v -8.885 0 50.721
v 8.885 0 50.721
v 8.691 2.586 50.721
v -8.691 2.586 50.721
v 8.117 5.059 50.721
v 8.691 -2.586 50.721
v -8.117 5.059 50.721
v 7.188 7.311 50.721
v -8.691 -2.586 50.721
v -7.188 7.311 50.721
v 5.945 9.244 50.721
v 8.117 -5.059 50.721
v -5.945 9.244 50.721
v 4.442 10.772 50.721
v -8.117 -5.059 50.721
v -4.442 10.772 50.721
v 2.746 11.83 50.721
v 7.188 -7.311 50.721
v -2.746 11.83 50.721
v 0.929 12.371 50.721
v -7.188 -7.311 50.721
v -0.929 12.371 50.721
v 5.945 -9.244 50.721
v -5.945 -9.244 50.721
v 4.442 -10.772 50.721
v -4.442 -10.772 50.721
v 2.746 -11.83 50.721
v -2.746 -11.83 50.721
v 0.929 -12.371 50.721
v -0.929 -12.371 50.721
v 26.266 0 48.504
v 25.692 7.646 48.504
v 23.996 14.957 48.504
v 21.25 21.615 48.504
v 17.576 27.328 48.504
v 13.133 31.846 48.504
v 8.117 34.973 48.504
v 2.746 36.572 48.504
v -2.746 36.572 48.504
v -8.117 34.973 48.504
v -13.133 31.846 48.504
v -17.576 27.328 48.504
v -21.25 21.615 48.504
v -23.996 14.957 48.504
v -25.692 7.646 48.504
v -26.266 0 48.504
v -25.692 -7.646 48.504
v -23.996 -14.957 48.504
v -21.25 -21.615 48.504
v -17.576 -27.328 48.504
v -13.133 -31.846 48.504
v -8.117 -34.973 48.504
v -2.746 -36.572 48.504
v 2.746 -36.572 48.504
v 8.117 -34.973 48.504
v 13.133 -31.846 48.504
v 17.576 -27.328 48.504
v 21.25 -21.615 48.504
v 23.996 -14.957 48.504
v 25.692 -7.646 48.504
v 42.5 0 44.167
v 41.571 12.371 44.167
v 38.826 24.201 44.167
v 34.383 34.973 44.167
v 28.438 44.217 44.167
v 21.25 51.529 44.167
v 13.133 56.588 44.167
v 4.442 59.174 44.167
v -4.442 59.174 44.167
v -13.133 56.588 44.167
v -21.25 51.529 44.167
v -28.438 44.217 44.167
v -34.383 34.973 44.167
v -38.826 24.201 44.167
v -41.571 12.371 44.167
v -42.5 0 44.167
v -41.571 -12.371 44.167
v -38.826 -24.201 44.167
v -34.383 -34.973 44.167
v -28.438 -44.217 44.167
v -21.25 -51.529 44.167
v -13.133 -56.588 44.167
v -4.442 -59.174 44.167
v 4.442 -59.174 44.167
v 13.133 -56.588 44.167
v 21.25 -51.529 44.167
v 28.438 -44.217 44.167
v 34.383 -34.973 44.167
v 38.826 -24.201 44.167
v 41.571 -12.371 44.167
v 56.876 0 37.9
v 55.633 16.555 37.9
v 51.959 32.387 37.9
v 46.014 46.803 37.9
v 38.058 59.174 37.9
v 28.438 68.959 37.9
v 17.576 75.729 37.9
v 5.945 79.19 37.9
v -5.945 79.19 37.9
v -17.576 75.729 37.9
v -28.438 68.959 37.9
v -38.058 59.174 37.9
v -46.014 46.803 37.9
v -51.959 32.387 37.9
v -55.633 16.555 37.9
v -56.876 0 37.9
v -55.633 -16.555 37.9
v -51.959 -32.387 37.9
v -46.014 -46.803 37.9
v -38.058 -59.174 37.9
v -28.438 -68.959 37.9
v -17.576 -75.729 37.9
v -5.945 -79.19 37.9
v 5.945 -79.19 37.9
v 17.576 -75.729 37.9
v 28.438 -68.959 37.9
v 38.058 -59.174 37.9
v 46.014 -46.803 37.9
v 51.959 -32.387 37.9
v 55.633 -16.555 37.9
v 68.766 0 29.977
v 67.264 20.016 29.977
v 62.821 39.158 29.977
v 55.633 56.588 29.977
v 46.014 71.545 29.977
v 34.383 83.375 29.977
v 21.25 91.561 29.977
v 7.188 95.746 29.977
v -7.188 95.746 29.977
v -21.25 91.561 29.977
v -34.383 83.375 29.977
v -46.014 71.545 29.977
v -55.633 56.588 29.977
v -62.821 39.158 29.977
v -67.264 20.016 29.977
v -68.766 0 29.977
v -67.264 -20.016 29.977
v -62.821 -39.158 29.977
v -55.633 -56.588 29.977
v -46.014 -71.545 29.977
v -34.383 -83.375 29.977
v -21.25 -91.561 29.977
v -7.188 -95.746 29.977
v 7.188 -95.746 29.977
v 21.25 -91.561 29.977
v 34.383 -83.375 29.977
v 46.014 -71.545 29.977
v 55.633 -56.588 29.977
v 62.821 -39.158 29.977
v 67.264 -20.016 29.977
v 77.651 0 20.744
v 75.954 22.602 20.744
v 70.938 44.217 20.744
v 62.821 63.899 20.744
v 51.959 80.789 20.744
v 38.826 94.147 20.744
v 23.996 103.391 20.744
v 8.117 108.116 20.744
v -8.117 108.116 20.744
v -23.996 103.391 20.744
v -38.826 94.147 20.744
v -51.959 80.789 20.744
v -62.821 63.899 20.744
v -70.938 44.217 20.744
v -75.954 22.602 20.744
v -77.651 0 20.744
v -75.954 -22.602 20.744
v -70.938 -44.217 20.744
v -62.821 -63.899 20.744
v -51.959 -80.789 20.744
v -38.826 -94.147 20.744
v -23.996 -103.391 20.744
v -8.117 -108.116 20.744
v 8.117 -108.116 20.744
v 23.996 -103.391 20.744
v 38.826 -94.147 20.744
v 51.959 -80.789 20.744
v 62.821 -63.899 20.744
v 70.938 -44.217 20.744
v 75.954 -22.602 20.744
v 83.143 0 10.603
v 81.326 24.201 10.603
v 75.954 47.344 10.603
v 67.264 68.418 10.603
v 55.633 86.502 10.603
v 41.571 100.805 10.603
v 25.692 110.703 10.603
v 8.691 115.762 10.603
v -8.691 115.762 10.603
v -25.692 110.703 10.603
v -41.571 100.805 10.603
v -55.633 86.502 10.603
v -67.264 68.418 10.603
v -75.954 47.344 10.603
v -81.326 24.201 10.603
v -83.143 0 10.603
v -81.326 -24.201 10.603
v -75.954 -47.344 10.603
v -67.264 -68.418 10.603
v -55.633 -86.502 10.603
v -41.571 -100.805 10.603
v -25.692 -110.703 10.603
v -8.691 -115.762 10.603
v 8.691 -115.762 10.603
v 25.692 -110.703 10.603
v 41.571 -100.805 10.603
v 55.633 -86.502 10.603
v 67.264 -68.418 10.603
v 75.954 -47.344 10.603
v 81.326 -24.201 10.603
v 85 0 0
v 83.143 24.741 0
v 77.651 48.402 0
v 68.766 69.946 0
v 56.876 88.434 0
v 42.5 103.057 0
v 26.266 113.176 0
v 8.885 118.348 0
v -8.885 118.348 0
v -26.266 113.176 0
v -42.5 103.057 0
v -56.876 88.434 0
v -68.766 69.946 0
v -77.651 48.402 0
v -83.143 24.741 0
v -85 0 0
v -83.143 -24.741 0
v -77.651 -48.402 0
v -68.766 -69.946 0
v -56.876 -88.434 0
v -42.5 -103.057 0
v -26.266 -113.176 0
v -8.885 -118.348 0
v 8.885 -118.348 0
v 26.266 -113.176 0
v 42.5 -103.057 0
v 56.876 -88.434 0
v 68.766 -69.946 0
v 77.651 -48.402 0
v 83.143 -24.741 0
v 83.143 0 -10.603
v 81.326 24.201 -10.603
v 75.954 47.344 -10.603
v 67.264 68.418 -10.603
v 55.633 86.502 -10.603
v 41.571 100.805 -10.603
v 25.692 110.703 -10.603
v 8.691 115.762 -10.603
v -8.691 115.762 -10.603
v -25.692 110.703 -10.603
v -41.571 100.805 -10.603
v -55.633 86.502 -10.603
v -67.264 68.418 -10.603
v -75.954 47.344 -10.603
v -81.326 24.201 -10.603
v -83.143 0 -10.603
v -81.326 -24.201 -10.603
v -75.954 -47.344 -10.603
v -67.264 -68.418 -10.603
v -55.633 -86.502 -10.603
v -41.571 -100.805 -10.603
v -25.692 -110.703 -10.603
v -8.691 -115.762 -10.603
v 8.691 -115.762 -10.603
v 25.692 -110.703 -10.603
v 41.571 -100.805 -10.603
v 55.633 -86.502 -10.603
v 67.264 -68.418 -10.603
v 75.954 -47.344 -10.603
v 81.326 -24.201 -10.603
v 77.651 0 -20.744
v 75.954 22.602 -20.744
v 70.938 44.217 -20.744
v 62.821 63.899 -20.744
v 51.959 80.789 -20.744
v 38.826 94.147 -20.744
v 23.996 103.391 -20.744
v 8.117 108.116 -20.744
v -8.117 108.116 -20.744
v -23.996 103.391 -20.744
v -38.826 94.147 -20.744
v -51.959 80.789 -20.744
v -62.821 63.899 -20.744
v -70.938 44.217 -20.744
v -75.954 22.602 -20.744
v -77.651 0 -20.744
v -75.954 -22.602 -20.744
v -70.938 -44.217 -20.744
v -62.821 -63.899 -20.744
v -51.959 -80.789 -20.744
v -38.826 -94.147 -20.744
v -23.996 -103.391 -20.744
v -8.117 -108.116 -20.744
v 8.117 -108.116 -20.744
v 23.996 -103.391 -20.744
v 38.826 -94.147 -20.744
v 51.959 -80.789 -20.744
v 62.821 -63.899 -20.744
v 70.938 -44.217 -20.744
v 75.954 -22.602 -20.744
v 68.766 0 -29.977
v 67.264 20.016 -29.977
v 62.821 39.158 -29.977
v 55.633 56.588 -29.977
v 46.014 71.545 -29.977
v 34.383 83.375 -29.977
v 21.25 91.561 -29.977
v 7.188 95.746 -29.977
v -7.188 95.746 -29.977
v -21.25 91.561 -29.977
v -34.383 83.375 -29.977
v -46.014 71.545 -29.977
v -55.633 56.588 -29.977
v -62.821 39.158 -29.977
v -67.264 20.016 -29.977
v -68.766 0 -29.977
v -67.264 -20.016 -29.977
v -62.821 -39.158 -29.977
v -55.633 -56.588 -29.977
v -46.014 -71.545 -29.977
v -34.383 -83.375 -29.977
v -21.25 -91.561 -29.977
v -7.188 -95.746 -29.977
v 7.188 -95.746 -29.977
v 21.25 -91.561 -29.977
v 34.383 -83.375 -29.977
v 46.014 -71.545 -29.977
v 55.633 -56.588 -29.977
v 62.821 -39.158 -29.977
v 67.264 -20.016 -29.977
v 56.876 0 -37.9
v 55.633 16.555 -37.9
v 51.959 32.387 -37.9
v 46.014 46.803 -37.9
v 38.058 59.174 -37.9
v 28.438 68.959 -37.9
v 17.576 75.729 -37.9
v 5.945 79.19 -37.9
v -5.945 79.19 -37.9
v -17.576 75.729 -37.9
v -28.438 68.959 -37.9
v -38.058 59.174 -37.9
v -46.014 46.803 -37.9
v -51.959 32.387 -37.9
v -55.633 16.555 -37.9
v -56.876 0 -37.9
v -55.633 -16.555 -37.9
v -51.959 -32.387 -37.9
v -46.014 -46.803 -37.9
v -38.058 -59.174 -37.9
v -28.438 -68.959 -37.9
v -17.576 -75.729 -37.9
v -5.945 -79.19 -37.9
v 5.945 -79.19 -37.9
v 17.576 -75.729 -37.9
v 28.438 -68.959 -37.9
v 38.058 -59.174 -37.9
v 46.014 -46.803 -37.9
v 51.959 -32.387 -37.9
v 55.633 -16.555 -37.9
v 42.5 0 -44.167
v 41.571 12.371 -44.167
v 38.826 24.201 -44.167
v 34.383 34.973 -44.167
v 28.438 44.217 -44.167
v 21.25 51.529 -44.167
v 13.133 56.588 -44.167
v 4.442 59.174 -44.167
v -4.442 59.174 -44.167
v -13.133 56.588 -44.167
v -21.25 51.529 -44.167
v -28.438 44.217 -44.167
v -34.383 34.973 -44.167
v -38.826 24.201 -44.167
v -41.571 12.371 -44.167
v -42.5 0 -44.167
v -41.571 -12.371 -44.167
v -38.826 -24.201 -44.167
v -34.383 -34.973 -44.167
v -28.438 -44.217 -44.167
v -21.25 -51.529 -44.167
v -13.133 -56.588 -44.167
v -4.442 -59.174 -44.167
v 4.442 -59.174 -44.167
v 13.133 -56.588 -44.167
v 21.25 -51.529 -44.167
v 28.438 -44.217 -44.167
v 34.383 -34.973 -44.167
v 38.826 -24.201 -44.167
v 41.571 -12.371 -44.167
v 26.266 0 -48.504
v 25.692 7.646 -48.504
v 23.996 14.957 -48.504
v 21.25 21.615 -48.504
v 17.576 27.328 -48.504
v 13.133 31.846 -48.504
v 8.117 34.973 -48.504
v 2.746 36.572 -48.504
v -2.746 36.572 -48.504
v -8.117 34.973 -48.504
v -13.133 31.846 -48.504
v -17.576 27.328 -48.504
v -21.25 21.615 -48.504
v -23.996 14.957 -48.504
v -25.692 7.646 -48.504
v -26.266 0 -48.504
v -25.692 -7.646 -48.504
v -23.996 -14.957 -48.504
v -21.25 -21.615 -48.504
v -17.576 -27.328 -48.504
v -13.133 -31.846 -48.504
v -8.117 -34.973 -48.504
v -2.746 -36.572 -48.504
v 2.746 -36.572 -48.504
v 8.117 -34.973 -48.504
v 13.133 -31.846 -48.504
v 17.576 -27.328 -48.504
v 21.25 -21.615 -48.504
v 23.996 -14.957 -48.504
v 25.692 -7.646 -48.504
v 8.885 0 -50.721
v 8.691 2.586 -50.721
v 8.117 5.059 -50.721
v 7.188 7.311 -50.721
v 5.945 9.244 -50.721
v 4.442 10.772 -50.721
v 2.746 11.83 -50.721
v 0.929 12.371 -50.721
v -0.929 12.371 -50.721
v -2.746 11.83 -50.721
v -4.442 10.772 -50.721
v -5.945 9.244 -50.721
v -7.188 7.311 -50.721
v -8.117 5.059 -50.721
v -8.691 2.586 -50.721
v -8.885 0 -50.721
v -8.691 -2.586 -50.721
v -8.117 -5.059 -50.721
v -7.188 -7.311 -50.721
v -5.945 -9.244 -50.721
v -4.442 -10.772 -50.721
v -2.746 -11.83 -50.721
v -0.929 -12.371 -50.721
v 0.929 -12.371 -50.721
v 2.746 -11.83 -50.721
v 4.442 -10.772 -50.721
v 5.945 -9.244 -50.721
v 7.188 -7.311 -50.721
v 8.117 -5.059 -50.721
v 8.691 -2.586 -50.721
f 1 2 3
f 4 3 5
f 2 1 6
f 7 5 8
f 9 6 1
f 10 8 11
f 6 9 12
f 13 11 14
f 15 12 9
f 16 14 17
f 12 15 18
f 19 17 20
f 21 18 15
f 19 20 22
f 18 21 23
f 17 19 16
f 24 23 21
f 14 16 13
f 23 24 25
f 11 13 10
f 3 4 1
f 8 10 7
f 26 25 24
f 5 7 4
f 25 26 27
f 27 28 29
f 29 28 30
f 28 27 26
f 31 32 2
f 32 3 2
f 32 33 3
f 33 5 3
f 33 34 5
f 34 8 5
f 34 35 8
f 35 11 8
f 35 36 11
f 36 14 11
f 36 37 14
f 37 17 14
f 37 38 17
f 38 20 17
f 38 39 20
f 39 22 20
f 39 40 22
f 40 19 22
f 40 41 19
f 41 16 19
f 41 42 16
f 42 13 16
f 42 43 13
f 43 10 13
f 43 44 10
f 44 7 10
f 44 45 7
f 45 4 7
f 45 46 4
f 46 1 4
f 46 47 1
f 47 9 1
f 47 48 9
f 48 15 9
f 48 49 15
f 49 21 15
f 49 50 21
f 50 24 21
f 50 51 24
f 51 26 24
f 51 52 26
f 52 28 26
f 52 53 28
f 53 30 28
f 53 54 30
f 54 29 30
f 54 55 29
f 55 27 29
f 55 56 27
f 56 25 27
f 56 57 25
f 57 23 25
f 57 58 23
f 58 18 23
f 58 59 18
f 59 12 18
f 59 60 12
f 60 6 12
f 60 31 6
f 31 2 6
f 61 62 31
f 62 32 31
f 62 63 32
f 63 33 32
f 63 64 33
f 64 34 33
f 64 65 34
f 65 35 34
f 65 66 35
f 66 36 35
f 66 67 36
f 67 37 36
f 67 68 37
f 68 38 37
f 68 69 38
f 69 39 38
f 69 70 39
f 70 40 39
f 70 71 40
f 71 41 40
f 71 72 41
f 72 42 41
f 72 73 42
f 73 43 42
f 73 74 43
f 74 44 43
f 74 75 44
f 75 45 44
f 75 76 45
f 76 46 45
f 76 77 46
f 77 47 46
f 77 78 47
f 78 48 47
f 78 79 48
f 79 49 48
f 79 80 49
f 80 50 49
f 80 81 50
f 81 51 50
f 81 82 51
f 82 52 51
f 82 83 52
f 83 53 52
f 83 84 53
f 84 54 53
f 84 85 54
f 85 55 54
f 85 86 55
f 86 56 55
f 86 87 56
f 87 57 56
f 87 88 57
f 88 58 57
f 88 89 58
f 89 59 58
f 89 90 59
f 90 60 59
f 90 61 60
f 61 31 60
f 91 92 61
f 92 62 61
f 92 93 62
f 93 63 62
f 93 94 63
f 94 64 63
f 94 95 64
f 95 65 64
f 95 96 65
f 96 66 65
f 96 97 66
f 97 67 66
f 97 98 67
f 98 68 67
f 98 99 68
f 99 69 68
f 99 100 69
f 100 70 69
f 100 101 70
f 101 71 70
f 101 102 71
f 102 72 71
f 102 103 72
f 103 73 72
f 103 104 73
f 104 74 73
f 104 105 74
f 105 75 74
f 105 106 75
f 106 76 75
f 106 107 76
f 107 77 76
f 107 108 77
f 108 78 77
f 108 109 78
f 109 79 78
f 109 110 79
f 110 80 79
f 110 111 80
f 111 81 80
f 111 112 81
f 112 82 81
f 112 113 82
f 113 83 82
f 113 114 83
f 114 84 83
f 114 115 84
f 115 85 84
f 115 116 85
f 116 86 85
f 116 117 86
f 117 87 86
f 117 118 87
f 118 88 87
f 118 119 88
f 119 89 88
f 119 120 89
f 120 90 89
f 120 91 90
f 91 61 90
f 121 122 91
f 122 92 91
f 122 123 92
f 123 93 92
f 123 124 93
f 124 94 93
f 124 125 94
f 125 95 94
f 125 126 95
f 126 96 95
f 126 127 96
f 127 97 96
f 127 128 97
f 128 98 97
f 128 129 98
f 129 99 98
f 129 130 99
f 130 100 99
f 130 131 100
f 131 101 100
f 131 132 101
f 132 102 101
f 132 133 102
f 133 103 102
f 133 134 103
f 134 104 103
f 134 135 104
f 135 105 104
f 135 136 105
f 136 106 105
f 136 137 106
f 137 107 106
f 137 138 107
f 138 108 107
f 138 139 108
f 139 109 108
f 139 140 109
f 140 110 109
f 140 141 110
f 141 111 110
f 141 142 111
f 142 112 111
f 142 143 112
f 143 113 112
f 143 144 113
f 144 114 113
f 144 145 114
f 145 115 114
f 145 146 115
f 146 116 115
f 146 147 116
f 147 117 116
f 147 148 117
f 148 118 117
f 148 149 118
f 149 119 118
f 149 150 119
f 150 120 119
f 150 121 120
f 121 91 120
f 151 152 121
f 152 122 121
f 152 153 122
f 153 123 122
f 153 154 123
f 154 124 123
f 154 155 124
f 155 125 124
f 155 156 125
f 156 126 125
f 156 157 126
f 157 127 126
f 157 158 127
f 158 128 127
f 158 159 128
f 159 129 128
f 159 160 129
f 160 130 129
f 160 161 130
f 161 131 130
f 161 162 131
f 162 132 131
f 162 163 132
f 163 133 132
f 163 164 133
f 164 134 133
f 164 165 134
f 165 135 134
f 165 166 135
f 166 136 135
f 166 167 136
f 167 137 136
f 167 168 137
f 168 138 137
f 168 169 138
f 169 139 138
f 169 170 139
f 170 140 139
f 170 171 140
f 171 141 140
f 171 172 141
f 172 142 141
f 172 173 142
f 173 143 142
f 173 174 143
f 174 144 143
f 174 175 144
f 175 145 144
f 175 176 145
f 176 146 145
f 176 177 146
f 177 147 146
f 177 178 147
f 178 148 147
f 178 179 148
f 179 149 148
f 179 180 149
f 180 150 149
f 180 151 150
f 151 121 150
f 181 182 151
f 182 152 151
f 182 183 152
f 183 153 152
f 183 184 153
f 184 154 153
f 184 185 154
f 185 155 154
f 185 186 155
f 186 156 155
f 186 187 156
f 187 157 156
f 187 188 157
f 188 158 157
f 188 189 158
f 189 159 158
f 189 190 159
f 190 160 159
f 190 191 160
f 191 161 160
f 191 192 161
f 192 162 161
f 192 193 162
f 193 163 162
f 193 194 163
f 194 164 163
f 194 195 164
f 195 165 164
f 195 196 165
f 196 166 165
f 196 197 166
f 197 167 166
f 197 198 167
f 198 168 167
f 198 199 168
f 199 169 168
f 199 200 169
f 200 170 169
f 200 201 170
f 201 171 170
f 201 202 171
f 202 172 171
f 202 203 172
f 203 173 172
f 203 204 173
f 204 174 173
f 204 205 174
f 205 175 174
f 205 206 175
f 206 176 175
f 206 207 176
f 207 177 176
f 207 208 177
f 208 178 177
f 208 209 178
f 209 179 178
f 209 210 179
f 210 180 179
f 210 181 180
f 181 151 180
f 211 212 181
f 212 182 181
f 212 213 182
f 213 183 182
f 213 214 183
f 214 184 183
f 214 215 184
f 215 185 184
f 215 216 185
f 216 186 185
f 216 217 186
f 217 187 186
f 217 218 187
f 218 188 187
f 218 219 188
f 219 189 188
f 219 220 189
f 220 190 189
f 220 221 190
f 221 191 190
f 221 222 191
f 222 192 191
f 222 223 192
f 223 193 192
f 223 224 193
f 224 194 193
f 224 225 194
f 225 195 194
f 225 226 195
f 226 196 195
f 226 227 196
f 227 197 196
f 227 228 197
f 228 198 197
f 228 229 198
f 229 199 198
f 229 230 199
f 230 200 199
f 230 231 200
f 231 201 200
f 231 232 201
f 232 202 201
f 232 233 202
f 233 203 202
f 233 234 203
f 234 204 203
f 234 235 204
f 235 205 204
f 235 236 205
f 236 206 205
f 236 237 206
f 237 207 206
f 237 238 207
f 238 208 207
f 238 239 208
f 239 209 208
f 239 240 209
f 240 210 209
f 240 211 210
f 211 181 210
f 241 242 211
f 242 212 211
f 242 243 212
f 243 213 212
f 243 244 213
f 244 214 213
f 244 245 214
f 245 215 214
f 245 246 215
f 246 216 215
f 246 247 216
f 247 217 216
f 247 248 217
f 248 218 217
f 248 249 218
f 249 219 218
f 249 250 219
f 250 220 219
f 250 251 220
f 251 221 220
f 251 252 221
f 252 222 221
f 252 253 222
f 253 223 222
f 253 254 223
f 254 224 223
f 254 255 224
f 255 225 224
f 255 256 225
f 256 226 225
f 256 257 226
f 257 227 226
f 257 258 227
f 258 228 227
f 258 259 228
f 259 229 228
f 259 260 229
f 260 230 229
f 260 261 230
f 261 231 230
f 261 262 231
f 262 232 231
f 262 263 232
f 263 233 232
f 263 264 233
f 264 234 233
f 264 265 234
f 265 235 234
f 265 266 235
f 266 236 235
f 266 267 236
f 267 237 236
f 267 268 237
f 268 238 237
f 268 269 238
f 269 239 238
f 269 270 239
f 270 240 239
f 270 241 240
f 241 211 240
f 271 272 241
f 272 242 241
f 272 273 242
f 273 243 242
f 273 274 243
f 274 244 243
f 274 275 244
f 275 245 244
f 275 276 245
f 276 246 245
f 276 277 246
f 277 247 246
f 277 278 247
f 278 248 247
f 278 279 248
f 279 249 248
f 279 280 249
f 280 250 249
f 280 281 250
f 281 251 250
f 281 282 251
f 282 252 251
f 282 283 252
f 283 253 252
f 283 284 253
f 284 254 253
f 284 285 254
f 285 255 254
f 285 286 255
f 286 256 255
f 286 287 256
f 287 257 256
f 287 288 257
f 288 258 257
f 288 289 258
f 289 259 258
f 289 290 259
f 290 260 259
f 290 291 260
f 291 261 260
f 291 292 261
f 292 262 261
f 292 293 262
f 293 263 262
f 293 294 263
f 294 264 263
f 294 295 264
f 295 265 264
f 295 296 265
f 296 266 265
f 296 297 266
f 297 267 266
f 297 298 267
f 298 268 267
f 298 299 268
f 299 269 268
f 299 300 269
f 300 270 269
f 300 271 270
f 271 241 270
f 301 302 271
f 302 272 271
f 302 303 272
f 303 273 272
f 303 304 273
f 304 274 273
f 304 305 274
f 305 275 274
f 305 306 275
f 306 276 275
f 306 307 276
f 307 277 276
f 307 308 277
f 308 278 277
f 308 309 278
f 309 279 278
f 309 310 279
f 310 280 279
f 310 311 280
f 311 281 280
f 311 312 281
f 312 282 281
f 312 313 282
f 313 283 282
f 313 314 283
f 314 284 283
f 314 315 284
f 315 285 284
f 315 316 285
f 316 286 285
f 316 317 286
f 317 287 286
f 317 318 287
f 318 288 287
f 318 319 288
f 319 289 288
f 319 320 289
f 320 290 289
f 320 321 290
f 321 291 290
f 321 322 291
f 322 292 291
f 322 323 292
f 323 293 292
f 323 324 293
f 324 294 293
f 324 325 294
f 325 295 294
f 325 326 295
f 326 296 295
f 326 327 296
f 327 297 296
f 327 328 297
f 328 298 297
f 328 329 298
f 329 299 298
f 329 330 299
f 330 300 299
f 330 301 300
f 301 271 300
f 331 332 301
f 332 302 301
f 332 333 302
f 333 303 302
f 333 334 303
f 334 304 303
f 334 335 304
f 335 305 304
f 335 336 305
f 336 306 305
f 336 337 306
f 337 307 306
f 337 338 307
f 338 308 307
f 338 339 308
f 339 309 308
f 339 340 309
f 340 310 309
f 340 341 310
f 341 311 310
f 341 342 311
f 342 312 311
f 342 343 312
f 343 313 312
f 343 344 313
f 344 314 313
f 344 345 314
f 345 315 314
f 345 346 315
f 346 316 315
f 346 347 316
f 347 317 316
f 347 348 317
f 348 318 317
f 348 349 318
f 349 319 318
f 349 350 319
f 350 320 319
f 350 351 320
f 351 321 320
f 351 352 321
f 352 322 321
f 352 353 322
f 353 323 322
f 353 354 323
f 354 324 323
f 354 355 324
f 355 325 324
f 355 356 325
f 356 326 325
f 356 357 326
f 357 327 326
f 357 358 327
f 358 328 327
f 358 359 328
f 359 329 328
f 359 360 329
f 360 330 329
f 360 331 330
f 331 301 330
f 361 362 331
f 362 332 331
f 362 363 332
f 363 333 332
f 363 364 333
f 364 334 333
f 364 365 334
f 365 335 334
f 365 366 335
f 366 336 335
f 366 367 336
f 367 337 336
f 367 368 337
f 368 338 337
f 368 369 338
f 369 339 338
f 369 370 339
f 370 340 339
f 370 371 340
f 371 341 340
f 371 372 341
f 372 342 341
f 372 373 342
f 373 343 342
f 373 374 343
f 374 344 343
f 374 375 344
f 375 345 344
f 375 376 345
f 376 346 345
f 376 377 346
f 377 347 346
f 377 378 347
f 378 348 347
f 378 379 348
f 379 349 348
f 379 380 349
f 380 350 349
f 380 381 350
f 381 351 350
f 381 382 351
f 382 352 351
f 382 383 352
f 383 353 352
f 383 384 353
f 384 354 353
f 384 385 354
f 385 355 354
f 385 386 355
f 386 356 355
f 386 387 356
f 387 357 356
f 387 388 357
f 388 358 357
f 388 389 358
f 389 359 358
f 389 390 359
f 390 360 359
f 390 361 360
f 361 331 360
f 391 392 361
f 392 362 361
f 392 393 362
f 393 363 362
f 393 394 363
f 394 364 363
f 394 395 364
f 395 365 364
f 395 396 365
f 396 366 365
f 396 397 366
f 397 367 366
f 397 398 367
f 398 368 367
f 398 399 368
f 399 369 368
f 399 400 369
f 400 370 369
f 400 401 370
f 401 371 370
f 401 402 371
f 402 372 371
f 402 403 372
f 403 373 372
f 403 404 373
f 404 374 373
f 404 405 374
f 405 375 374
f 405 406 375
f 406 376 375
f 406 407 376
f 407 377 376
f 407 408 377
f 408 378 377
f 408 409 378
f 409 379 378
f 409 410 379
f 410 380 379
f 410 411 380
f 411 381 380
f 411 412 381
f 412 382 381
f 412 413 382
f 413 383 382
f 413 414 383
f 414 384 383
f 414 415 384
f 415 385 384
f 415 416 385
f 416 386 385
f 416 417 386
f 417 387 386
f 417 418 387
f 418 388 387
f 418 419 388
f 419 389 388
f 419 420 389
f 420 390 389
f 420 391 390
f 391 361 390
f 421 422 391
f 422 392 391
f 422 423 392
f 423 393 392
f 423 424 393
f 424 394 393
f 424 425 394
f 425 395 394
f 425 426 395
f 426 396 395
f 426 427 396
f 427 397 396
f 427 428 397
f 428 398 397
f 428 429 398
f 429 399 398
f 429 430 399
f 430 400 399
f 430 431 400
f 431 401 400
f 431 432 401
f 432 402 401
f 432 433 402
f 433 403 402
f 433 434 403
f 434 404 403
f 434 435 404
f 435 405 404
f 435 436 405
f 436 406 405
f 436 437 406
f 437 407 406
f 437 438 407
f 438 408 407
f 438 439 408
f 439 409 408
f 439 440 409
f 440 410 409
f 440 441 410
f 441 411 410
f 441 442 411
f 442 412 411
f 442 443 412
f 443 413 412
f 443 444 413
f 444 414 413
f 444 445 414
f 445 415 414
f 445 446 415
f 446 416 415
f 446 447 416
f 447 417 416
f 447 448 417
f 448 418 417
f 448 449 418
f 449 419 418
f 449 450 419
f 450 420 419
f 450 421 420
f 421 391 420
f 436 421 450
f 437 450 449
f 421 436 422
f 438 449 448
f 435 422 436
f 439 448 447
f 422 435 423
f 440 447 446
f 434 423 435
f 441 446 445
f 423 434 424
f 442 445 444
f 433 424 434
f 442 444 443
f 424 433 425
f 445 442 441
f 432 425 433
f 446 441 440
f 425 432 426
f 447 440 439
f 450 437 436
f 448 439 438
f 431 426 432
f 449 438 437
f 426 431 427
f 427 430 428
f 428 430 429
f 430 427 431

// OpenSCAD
// Generated by SolidPython 1.0.1 on 2020-07-29 00:46:46


scale(v = [5, 7, 3]) {
	sphere(r = 17);
}
/***********************************************
*********      SolidPython code:      **********
************************************************
 
# import packages: SolidPython
from solid import *
from solid.utils import *
from itertools import chain, combinations, permutations


class Resize:

    def __init__(self, scad_file):
        self.scad_file = scad_file
        #self.scad_file = import_scad(scad_file)
        # cone/cylinder param:
        self.r1 = 0
        self.r2 = 0
        self.h = 0
        # rectangular prism param:
        self.w = 0
        self.l = 0
        # ellipse param:
        self.r = 0

    # import OpenScad code (file name corresponds to shape)


    # classify shape + parameters
    def assign(self, param1, param2, param3):
        if self.scad_file == 'cone.scad':
            self.r1 = param1
            self.r2 = param2
            self.h = param3
        elif self.scad_file == 'cylinder.scad':
            self.r1 = param1
            self.r2 = param2
            self.h = param3
        elif self.scad_file == 'rectangularPrism.scad':
            self.h = param1
            self.l = param2
            self.w = param3
        else:
            self.r = param1
            self.h = param2

    # resize parameters
    def iterate(self):
        x = range(3, 20, 2)
        i = 1
        if self.scad_file == 'cone.scad':
            tempList = list(permutations(x, 2))
            for temp in tempList:
                param1 = temp[0]
                param2 = temp[1]
                filepath = 'produced_scad_files/' + 'cone' + str(param1) + '_' + str(param2) + '_' + '.scad'
                scad_render_to_file(cylinder(h=param1, r1=param2, r2=0), filepath)

        elif self.scad_file == 'cylinder.scad':
            tempList = list(permutations(x, 3))
            for temp in tempList:
                param1 = temp[0]
                param2 = temp[1]
                filepath = 'produced_scad_files/' + 'cylinder' + str(param1) + '_' + str(param2) + '_' + '.scad'
                scad_render_to_file(cylinder(h=param1, r1=param2, r2=param2), filepath)

        elif self.scad_file == 'rectangularPrism.scad':
            tempList = list(permutations(x, 3))
            for temp in tempList:
                param1 = temp[0]
                param2 = temp[1]
                param3 = temp[2]
                filepath = 'produced_scad_files/' + 'rectangularPrism' + str(param1) + '_' + str(param2) + '_' + str(
                    param3) + '.scad'
                scad_render_to_file(cube(size=(param1, param2, param3)), filepath)

        elif self.scad_file == 'ellipse.scad':
            tempList = list(permutations(x, 4))
            for temp in tempList:
                param1 = temp[0]
                param2 = temp[1]
                param3 = temp[2]
                param4 = temp[3]
                filepath = 'produced_scad_files/' + 'ellipse' + str(param1) + '_' + str(param2) + '_' + str(param3) + '_' + str(param4) + '.scad'
                scad_render_to_file(scale([param1, param2, param3])(sphere(r=param4)), filepath)

    def render_to_scadfile(self):
        scad_render_to_file(scad, 'example.scad') 
 
************************************************/
